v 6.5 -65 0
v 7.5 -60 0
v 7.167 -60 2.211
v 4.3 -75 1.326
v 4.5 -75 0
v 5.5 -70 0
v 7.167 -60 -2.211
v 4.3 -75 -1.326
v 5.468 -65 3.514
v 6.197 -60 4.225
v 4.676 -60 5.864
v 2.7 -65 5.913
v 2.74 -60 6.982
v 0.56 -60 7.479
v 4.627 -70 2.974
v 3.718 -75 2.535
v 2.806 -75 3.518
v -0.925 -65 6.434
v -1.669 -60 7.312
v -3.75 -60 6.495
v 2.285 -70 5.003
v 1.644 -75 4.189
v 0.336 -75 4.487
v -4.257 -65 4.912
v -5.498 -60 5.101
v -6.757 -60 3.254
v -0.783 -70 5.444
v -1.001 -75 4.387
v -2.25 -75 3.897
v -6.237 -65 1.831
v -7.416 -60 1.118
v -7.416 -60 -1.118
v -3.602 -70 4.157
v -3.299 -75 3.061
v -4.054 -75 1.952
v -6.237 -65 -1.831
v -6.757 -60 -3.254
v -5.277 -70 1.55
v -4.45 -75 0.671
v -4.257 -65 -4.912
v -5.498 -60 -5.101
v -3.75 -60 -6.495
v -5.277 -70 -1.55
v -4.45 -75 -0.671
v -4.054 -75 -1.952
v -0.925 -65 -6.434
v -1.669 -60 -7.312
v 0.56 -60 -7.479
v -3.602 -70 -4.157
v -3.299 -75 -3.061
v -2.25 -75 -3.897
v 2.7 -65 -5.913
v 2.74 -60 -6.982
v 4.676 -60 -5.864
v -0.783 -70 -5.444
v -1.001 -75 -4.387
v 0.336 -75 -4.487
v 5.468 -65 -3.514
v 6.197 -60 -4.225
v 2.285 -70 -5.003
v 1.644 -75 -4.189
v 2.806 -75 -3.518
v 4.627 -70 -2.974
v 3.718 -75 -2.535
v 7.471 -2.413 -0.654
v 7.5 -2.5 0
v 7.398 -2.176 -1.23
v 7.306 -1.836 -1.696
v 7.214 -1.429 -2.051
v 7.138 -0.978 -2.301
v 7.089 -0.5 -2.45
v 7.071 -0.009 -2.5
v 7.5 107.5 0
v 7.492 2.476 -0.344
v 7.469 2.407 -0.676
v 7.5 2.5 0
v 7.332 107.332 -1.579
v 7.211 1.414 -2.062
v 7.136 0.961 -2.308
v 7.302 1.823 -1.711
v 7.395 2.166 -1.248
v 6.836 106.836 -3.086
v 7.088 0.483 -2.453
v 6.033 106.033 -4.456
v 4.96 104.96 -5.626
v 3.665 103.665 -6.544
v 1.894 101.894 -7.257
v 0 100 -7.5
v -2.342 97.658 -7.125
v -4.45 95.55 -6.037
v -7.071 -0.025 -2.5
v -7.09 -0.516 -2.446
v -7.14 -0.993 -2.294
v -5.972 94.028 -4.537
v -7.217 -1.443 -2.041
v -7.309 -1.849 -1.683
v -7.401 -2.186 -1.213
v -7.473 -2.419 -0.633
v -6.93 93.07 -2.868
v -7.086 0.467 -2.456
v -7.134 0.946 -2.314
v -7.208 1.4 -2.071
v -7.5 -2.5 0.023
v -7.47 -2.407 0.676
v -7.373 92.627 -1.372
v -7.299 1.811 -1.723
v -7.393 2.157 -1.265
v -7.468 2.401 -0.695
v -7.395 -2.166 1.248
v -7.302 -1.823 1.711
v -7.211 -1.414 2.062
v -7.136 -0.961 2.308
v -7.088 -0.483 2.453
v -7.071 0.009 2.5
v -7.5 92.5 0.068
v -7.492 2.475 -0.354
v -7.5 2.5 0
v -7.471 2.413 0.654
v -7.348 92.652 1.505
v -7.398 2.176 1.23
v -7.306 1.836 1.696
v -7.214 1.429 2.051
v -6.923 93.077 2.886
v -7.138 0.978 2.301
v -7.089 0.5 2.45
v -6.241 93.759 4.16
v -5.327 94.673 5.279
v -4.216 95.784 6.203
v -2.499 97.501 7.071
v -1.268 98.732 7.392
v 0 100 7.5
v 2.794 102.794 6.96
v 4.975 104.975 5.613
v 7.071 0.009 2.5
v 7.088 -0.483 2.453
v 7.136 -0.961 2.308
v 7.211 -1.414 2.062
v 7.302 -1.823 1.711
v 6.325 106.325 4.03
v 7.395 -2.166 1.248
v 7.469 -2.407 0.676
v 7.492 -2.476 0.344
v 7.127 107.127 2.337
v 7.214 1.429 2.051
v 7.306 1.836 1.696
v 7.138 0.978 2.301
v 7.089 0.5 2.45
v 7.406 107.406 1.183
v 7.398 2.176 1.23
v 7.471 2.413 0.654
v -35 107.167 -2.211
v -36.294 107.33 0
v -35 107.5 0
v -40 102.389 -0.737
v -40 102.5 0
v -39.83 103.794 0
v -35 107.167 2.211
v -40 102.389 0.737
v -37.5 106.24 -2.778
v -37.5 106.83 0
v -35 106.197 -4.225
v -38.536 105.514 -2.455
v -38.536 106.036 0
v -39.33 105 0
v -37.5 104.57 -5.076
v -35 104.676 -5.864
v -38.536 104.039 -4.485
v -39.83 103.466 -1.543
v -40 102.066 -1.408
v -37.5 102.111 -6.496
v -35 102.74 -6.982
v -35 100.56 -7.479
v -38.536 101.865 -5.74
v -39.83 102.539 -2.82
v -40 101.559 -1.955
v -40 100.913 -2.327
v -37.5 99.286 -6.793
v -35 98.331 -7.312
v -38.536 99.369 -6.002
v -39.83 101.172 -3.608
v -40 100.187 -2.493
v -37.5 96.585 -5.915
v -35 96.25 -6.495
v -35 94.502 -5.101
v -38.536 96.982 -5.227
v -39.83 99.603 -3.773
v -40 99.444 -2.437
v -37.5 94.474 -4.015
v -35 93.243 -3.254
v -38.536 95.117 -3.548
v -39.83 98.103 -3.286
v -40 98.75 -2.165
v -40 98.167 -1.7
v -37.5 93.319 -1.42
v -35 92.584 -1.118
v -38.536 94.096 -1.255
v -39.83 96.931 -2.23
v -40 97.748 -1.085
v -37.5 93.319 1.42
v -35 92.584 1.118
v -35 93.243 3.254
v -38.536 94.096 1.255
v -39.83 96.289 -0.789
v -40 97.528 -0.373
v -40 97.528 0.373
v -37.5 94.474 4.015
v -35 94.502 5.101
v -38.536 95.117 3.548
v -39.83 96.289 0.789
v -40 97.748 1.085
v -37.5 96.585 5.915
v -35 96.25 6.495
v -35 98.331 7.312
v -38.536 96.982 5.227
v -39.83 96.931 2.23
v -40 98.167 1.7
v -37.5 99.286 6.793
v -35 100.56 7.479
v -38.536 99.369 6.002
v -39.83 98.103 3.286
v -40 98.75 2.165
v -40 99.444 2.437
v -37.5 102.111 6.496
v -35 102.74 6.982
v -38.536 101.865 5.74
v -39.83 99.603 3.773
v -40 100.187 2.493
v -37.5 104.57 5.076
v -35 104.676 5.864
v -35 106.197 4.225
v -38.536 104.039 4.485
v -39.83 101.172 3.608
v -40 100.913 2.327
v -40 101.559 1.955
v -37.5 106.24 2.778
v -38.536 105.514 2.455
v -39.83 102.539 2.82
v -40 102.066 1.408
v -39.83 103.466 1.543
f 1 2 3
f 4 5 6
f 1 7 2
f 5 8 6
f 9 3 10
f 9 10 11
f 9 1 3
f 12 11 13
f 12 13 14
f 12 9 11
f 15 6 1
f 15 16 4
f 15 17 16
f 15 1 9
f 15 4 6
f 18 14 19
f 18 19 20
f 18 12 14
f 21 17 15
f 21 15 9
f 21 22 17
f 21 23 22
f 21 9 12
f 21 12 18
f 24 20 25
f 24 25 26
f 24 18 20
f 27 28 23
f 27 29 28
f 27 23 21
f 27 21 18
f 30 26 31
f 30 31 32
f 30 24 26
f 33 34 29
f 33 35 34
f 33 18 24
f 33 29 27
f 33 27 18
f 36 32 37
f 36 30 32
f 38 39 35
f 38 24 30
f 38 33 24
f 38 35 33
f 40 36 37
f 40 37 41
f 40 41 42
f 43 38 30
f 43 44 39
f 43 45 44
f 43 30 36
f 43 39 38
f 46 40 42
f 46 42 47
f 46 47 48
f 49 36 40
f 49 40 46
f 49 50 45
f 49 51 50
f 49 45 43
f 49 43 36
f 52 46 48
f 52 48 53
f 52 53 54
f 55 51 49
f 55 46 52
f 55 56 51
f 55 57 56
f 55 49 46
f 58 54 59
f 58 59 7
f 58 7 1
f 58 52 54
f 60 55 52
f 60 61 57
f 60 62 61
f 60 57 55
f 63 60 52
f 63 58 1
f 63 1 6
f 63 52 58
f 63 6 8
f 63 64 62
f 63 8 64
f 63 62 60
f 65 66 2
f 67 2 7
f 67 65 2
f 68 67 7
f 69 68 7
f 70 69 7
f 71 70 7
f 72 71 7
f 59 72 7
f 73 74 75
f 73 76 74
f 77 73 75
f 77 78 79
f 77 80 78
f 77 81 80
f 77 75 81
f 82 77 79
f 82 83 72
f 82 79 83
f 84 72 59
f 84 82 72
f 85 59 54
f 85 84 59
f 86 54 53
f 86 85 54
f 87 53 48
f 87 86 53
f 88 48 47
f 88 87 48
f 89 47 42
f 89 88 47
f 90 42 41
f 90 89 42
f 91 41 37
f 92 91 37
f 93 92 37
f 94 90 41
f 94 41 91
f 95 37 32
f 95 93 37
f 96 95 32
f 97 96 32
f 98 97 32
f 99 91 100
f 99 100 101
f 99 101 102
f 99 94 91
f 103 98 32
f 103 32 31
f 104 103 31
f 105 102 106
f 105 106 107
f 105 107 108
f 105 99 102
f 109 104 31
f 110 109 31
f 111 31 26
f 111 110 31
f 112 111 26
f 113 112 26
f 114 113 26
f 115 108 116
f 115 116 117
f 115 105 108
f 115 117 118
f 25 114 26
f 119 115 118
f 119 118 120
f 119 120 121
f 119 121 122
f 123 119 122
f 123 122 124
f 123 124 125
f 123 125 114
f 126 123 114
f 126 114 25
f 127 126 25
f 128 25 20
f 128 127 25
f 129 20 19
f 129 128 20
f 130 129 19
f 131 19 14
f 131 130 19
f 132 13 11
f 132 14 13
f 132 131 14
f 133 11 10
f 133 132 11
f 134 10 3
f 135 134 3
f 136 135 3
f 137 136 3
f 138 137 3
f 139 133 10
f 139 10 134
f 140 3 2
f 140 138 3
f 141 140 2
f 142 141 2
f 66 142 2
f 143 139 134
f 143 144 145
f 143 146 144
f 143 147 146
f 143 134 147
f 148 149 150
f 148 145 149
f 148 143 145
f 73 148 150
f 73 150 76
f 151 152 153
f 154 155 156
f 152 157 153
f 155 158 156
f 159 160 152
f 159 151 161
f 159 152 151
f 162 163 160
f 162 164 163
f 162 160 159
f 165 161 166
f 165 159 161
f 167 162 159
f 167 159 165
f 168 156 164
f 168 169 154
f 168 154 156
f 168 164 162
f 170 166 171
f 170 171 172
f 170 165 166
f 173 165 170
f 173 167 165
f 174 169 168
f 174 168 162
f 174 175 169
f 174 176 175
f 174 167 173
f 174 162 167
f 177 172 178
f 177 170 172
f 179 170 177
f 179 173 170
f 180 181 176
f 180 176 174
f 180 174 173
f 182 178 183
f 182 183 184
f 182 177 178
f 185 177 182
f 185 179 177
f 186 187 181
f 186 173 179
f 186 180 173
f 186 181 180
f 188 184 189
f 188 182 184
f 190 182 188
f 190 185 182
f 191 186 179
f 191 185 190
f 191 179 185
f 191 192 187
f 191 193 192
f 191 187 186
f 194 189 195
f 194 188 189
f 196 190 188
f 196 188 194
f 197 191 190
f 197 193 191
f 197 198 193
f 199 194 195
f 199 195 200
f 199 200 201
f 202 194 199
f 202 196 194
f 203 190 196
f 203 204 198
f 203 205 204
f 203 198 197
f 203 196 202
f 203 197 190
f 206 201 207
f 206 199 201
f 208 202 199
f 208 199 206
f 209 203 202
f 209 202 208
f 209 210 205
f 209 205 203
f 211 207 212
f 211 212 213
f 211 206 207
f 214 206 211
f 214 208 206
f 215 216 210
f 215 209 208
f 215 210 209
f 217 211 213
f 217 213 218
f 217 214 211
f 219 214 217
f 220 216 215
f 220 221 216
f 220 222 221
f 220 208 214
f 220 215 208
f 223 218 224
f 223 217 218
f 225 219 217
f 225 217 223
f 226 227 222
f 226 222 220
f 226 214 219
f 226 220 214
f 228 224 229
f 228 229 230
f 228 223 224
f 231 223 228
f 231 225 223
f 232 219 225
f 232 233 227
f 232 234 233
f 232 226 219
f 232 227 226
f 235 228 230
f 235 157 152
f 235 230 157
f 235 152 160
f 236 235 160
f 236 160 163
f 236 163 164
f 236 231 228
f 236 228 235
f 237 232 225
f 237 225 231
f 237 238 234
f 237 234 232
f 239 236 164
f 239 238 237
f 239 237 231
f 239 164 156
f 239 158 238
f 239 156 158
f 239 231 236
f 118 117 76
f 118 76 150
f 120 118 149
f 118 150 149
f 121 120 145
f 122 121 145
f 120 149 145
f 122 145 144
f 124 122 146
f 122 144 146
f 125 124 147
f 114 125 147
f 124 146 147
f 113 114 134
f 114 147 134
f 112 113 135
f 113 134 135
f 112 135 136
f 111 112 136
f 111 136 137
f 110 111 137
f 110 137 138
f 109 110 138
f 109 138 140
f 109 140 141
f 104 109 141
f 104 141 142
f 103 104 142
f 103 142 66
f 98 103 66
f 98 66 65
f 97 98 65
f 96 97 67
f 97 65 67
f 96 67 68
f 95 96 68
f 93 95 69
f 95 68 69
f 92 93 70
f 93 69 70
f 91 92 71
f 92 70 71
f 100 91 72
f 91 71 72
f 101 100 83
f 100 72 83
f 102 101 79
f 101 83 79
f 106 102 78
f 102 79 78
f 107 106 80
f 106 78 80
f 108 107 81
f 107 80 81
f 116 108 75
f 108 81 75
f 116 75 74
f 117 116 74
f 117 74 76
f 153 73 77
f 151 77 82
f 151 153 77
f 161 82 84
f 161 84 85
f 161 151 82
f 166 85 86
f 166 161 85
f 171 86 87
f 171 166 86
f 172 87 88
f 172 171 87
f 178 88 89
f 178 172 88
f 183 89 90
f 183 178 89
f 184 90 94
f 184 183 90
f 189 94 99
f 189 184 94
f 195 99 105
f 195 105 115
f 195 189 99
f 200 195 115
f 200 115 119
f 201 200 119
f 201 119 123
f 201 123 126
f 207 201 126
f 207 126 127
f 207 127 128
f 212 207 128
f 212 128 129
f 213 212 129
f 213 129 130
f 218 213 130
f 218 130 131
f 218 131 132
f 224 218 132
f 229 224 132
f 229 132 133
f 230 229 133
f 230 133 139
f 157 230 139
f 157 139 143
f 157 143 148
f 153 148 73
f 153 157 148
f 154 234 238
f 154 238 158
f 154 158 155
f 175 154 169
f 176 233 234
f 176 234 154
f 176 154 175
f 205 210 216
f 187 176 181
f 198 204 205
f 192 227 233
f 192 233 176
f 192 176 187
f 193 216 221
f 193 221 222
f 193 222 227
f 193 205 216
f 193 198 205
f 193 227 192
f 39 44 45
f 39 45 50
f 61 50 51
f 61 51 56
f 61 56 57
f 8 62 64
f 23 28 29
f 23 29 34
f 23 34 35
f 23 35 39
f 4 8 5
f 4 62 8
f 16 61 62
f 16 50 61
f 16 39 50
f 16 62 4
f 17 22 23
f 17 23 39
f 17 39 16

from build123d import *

# Parameters (mm, degrees)
F0_R      = 7.5
F1_DEPTH  = 75
F1_FACE_R = 7.5
F4_R      = 2.5
F5_DEPTH  = 7.5
F7_D      = 5
F8_SIZE2  = 3
F8_SIZE   = 15
F9_R      = 5


with BuildPart() as f1:
    # F0 (on Front) → F1 (new body)
    with BuildSketch(Plane.XZ):
        Circle(F0_R)
    extrude(amount=F1_DEPTH)

    # F3: sweep along a path in F2
    with BuildLine(Plane.XY) as f3_path:
        Line((0, 0), (0, 100))
        Line((0, 100), (-40, 100))
    # F1_face (on face) → F3 (sweep)
    with BuildSketch(Plane(origin=(0, 0, 0), x_dir=(1, 0, 0), z_dir=(0, 1, 0))):
        Circle(F1_FACE_R)
    sweep(path=f3_path.line, transition=Transition.RIGHT)

    # F4 (on Right) → F5 (join, symmetric)
    with BuildSketch(Plane.YZ):
        Circle(F4_R)
    extrude(amount=F5_DEPTH, both=True)

    # F7 (through all)
    with Locations(Plane(origin=(-7.5, 0, 0), x_dir=(0, -1, 0), z_dir=(-1, 0, 0))):
        with Locations((0, 0)):
            Hole(F7_D / 2)

    # F8
    f8_edges = [f1.edges().sort_by_distance(p)[0] for p in [
        (-7.5, -75, 0),
    ]]
    f8_side = f1.faces().sort_by_distance((-7.5, 16.25, 0))[0]
    chamfer(f8_edges, length=F8_SIZE, length2=F8_SIZE2, reference=f8_side)

    # F9
    f9_edges = [f1.edges().sort_by_distance(p)[0] for p in [
        (-40, 92.5, 0),
    ]]
    fillet(f9_edges, radius=F9_R)


solid = f1.part
